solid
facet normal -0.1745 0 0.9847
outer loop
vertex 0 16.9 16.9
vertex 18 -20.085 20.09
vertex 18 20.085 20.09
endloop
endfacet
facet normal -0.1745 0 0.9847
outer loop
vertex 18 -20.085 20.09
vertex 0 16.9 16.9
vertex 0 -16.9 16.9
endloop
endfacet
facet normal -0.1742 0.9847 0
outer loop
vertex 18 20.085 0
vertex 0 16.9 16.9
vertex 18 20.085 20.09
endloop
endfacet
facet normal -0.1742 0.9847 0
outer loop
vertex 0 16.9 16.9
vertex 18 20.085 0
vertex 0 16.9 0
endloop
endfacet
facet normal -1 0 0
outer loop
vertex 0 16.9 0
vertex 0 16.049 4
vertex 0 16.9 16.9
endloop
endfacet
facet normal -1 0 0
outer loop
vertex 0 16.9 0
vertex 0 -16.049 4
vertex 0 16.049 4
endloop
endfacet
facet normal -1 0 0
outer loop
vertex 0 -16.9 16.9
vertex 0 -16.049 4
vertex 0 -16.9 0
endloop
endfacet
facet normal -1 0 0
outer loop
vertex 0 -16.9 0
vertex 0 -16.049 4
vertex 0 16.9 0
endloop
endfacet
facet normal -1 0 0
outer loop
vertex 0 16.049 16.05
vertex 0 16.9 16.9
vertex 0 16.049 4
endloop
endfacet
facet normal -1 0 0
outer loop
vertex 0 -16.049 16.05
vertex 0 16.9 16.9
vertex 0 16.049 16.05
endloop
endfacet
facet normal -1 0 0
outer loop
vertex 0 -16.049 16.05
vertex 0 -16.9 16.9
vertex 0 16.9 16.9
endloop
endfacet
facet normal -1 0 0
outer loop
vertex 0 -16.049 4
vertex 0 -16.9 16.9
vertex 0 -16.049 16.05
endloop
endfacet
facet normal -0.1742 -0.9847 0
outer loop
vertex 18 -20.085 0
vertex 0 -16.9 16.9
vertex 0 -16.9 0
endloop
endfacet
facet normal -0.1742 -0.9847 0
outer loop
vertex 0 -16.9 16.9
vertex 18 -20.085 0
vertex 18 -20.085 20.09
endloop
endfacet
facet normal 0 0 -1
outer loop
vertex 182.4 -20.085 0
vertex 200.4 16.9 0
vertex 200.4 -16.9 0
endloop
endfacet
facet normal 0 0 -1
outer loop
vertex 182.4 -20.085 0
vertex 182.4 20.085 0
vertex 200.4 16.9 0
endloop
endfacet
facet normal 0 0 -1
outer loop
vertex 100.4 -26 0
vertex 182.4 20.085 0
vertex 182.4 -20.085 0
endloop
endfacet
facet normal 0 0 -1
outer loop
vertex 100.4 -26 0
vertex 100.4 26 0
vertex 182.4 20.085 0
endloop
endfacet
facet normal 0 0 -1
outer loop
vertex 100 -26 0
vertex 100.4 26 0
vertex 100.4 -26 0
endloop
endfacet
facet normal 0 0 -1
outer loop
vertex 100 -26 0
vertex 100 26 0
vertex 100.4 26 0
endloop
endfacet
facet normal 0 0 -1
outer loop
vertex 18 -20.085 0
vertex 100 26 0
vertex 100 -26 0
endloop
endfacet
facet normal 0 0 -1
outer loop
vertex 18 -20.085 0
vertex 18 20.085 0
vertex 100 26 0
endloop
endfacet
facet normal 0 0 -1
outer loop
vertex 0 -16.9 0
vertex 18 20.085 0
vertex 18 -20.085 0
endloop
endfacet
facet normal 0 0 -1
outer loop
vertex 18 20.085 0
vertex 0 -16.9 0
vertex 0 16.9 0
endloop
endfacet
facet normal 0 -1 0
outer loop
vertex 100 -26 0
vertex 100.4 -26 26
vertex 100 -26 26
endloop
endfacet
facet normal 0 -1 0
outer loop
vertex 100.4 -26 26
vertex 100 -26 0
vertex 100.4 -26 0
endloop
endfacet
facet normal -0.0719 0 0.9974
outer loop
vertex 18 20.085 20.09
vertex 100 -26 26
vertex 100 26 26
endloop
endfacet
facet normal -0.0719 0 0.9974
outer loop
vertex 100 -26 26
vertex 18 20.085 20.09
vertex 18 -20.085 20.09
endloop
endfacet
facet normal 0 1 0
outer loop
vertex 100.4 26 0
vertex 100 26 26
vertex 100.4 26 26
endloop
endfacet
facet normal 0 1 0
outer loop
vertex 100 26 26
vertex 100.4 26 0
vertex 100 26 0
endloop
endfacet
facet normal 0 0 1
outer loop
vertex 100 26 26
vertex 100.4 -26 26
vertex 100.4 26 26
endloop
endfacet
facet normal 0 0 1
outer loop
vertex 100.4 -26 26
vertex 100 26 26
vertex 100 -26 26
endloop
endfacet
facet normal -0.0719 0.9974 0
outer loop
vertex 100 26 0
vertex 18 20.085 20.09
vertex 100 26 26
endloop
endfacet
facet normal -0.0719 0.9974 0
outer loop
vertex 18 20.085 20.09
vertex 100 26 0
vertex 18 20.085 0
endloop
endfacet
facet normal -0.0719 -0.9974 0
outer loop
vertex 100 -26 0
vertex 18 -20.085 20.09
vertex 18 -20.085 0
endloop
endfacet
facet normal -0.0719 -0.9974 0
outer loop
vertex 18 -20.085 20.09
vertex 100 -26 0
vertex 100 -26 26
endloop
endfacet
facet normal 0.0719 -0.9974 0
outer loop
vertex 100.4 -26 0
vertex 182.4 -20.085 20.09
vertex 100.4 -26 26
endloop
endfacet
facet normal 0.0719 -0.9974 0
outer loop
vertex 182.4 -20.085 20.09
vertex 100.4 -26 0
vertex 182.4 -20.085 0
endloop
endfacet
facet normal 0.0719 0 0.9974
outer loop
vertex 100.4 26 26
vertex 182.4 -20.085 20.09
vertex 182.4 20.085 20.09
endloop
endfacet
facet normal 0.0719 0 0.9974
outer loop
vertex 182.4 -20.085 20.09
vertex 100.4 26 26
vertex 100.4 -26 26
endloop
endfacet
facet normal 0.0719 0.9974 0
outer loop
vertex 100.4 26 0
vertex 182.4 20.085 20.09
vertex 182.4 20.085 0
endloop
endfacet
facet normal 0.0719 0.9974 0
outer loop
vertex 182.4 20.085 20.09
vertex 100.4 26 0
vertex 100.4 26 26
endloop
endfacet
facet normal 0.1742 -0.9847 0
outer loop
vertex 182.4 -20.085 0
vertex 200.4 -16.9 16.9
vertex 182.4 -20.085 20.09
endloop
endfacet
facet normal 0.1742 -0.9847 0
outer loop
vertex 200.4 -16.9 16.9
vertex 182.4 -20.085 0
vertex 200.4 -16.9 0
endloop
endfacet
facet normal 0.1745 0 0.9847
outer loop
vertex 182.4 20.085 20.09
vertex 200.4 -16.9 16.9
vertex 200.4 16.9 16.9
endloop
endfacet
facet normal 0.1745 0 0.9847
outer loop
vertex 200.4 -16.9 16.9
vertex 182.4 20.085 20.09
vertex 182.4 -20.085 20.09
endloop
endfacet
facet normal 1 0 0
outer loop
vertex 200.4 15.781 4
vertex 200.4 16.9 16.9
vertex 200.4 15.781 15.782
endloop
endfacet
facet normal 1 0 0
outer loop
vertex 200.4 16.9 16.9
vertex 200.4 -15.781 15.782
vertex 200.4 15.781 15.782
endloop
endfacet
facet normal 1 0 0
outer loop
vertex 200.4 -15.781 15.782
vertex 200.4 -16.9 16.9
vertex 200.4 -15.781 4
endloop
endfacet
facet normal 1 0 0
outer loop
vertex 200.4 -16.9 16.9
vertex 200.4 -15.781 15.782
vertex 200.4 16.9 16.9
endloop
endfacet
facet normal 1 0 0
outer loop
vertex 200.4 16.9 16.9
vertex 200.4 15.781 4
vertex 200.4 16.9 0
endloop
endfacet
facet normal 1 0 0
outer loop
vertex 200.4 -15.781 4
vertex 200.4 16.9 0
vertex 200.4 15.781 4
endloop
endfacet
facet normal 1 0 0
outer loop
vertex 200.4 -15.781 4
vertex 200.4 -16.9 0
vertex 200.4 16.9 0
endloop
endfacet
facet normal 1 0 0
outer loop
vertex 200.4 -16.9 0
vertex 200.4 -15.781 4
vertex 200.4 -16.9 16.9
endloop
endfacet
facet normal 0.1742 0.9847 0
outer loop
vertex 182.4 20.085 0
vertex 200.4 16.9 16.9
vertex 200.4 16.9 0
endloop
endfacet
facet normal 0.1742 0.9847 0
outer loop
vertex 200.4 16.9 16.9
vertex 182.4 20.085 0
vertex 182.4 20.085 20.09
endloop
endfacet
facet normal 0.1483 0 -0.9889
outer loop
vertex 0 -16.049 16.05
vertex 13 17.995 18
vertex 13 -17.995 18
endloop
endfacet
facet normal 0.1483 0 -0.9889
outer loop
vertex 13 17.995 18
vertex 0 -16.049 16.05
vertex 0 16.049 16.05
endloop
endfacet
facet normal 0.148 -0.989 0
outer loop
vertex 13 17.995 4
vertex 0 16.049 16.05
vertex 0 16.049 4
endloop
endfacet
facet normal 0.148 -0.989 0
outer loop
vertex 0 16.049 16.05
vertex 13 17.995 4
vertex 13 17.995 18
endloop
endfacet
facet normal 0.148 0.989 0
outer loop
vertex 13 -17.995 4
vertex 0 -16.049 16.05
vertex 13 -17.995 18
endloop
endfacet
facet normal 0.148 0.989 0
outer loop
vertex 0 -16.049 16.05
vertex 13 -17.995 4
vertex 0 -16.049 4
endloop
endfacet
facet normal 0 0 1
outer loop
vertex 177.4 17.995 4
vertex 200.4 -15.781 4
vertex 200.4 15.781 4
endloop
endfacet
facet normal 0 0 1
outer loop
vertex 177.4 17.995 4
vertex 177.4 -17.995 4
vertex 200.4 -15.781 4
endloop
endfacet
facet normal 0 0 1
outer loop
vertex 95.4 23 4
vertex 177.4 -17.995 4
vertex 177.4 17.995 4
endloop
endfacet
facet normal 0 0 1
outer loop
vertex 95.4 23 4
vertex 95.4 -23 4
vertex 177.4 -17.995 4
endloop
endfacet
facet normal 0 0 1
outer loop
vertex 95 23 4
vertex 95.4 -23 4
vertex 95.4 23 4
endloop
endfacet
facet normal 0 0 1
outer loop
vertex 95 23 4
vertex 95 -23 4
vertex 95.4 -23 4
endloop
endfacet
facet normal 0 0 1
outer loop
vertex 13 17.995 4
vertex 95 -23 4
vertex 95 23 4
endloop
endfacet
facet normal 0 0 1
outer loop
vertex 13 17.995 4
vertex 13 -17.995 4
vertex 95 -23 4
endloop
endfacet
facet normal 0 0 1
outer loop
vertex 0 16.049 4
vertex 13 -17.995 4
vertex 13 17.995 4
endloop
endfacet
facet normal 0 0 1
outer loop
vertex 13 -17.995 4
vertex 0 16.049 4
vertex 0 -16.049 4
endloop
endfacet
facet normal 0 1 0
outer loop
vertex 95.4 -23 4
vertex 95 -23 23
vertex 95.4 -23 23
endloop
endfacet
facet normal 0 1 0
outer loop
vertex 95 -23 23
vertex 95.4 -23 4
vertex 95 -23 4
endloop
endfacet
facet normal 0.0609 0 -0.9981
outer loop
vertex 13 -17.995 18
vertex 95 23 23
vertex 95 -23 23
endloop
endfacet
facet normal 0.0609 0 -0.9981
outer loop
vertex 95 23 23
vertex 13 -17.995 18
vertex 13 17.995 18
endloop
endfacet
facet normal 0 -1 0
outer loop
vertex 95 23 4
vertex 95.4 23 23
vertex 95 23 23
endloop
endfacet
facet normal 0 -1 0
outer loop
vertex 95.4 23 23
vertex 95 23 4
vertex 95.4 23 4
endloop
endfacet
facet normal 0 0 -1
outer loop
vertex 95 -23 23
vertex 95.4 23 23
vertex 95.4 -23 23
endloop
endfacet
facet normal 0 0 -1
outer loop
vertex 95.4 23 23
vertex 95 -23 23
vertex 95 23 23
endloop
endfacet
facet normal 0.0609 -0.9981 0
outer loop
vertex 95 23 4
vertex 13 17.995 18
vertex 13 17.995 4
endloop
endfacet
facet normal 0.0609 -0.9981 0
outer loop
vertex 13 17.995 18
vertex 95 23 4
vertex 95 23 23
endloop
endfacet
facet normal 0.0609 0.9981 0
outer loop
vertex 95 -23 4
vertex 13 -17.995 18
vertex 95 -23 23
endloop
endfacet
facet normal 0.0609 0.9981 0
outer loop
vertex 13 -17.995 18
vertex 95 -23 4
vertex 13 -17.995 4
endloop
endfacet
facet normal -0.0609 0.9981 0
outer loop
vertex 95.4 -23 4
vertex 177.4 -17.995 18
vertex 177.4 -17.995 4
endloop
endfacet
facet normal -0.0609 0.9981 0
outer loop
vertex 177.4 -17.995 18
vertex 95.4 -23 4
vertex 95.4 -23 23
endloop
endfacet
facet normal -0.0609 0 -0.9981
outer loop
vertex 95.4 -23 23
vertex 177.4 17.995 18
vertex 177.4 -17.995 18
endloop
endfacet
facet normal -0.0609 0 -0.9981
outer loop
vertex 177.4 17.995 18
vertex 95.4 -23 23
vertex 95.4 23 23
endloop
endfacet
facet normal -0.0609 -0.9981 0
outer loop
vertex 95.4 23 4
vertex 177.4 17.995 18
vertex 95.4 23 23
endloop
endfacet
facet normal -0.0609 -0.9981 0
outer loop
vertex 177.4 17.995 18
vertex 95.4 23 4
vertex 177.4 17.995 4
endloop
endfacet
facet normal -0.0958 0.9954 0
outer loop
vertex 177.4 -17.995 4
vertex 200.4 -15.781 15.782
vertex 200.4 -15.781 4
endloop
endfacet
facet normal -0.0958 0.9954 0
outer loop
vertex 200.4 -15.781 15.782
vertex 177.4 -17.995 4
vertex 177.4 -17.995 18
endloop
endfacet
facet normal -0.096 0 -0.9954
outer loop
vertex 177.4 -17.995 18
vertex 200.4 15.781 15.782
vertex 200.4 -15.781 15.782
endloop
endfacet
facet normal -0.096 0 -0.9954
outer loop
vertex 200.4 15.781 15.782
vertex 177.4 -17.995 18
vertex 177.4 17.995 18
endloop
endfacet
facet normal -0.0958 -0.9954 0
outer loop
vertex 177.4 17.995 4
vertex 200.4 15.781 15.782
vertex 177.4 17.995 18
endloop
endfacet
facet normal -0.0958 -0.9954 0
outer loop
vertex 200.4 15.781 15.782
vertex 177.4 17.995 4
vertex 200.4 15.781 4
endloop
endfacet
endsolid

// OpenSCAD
$fn = 32;

// ----------------------------------------------------------------------
// Faired channel: 200 x 52 x 26 mm, 3 mm walls, faired ends
// ----------------------------------------------------------------------

// --- parameters (mm) ---
length = 200;             // channel length
width = 52;               // channel width at mid length
height = 26;              // channel height at mid length
wall = 3;                 // side wall thickness
floor_t = 4;              // floor thickness
end_w = 33.8;             // faired end width
end_h = 16.9;             // faired end height

difference() {
  union() {
    hull() {
      translate([0, -16.9, 0]) cube([0.4, 33.8, 16.9]);
      translate([18, -20.085, 0]) cube([0.4, 40.17, 20.09]);
    }
    hull() {
      translate([18, -20.085, 0]) cube([0.4, 40.17, 20.09]);
      translate([100, -26, 0]) cube([0.4, 52, 26]);
    }
    hull() {
      translate([100, -26, 0]) cube([0.4, 52, 26]);
      translate([182, -20.085, 0]) cube([0.4, 40.17, 20.09]);
    }
    hull() {
      translate([182, -20.085, 0]) cube([0.4, 40.17, 20.09]);
      translate([200, -16.9, 0]) cube([0.4, 33.8, 16.9]);
    }
  }
  /* cavity, 5 mm proud of both ends so the ports are cut clean */
  hull() {
    translate([-5, -15.3, 4]) cube([0.4, 30.6, 11.3]);
    translate([13, -17.995, 4]) cube([0.4, 35.99, 14]);
  }
  hull() {
    translate([13, -17.995, 4]) cube([0.4, 35.99, 14]);
    translate([95, -23, 4]) cube([0.4, 46, 19]);
  }
  hull() {
    translate([95, -23, 4]) cube([0.4, 46, 19]);
    translate([177, -17.995, 4]) cube([0.4, 35.99, 14]);
  }
  hull() {
    translate([177, -17.995, 4]) cube([0.4, 35.99, 14]);
    translate([205, -15.3, 4]) cube([0.4, 30.6, 11.3]);
  }
}
